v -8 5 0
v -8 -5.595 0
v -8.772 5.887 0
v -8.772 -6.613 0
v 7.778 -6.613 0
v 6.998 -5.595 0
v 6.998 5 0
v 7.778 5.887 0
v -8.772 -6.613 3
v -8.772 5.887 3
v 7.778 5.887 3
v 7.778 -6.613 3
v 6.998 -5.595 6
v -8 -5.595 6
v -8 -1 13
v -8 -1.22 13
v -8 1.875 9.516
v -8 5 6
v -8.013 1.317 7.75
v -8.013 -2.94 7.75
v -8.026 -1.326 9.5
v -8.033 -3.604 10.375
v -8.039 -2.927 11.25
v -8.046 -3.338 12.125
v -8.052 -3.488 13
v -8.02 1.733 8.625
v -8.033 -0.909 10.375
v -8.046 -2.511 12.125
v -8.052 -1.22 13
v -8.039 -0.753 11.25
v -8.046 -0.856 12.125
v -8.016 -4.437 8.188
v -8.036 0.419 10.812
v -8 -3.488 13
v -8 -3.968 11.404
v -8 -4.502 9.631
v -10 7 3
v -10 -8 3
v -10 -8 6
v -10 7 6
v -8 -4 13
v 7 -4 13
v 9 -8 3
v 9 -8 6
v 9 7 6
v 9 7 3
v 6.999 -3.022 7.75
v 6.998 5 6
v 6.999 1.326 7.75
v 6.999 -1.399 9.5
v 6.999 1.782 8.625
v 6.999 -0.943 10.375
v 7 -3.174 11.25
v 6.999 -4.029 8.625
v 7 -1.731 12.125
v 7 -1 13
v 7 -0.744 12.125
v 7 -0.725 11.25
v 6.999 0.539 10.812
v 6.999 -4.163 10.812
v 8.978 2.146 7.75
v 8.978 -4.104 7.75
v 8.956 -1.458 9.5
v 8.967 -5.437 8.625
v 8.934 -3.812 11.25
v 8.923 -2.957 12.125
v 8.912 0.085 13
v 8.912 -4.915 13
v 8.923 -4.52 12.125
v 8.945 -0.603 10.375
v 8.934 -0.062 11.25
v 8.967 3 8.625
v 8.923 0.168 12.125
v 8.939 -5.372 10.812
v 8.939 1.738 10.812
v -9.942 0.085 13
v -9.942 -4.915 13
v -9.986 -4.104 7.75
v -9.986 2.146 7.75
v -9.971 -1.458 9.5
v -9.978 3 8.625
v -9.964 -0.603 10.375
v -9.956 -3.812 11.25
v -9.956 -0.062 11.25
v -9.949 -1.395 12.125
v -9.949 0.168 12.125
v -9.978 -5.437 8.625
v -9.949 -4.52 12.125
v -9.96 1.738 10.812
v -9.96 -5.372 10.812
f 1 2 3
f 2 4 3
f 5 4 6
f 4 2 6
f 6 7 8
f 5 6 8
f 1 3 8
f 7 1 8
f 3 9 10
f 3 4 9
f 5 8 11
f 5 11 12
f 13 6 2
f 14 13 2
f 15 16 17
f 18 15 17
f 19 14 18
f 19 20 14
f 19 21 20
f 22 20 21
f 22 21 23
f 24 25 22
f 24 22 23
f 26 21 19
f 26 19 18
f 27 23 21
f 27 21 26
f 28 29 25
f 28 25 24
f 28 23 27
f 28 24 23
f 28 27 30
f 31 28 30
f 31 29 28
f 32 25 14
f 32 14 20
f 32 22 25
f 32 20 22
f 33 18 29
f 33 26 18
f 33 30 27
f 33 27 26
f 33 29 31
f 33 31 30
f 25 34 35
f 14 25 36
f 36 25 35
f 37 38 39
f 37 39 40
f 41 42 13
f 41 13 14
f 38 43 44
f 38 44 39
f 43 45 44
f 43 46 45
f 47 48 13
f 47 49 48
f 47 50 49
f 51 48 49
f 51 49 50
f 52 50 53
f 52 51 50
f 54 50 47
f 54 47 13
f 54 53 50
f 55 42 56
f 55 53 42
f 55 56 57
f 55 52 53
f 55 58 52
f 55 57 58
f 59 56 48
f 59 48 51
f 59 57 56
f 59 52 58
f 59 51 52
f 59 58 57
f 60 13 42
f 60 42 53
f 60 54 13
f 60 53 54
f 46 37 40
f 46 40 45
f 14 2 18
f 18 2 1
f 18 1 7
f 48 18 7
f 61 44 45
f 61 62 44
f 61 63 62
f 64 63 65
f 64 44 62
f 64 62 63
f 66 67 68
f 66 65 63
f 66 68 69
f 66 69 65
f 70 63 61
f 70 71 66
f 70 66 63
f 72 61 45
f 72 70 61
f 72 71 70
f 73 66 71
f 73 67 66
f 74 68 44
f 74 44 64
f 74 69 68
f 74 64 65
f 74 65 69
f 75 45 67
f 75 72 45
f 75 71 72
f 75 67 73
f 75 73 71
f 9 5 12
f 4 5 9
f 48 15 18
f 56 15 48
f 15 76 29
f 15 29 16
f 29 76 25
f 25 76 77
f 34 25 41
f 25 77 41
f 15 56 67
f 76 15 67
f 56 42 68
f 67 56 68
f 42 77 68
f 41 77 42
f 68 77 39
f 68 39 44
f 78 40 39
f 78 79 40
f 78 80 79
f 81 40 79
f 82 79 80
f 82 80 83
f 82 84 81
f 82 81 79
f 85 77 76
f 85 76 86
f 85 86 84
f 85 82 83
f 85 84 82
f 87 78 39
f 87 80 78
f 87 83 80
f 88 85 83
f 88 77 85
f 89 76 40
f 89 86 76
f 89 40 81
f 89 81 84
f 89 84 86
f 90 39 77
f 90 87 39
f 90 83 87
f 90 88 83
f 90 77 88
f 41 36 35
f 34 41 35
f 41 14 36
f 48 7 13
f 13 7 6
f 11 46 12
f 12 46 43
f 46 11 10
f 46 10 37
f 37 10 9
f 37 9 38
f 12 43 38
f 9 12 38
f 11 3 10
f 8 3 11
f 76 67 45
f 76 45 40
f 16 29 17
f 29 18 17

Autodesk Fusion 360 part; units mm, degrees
sketch "Sketch1" plane through (0, 0, 0) normal (0, 0, 1) x (1, 0, 0)
  line L0 (-8.7725, 5.8867) -> (7.7775, 5.8867)
  line L1 (7.7775, 5.8867) -> (7.7775, -6.6133)
  line L2 (7.7775, -6.6133) -> (-8.7725, -6.6133)
  line L3 (-8.7725, -6.6133) -> (-8.7725, 5.8867)
  line L4 (-8, 5) -> (6.9982, 5)
  line L5 (6.9982, 5) -> (6.9982, -5.595)
  line L6 (6.9982, -5.595) -> (-8, -5.595)
  line L7 (-8, -5.595) -> (-8, 5)
  dimension "d1" = 16.55
  dimension "d2" = 12.5
extrude "Extrude1" add sketch "Sketch1" along normal blind 3
sketch "Sketch2" plane through (0, 0, 3) normal (0, 0, 1) x (-1, 0, 0)
  line L0 (-6.9982, 5.595) -> (8, 5.595)
  line L1 (8, 5.595) -> (8, -5)
  line L2 (8, -5) -> (-6.9982, -5)
  line L3 (-6.9982, -5) -> (-6.9982, 5.595)
  line L4 (8.7725, 6.6133) -> (-7.7775, 6.6133)
  line L5 (-7.7775, 6.6133) -> (-7.7775, -5.8867)
  line L6 (-7.7775, -5.8867) -> (8.7725, -5.8867)
  line L7 (8.7725, -5.8867) -> (8.7725, 6.6133)
  line L8 (10, -7) -> (-9, -7)
  line L9 (-9, -7) -> (-9, 8)
  line L10 (-9, 8) -> (10, 8)
  line L11 (10, 8) -> (10, -7)
extrude "Extrude2" add sketch "Sketch2" along normal blind 3 contours L4 L5 L6 L7 | L8 L9 L10 L11
ref_plane "WorkPlane1" through (-0.5, -0.5, 13) normal (0, 0, 1) x (1, 0, 0)
sketch "Sketch4" plane through (-0.5, -0.5, 13) normal (0, 0, 1) x (1, 0, 0)
  line L0 (-9.442, -4.4154) -> (9.4117, -4.4154)
  line L1 (9.4117, -4.4154) -> (9.4117, 0.5846)
  line L2 (9.4117, 0.5846) -> (-9.442, 0.5846)
  line L3 (-9.442, 0.5846) -> (-9.442, -4.4154)
  line L4 (-7.5524, -2.9878) -> (7.4802, -2.9878)
  line L5 (7.4802, -2.9878) -> (7.4802, -0.7203)
  line L6 (7.4802, -0.7203) -> (-7.5524, -0.7203)
  line L7 (-7.5524, -0.7203) -> (-7.5524, -2.9878)
  dimension "d8" = 5
sketch "Sketch5" plane through (0, 0, 6) normal (0, 0, 1) x (-1, 0, 0)
  line L0 (8, -5) -> (-6.9982, -5)
  line L1 (-6.9982, -5) -> (-6.9982, 5.595)
  line L2 (-6.9982, 5.595) -> (8, 5.595)
  line L3 (8, 5.595) -> (8, -5)
  line L4 (10, 8) -> (-9, 8)
  line L5 (-9, 8) -> (-9, -7)
  line L6 (-9, -7) -> (10, -7)
  line L7 (10, -7) -> (10, 8)
  line L8 (10, -7) -> (-9, -7)
  line L9 (-9, -7) -> (-9, 8)
  line L10 (-9, 8) -> (10, 8)
  line L11 (10, 8) -> (10, -7)
loft "Loft1" add profiles "Sketch5", "Sketch4" section 1 section 2
sketch "Sketch6" plane through (0, 0, 13) normal (0, 0, 1) x (-1, 0, 0)
  line L0 (9.942, 4.9154) -> (-8.9117, 4.9154)
  line L1 (-8.9117, 4.9154) -> (-8.9117, -0.0846)
  line L2 (-8.9117, -0.0846) -> (9.942, -0.0846)
  line L3 (9.942, -0.0846) -> (9.942, 4.9154)
  line L4 (8, 1) -> (-7, 1)
  line L5 (-7, 1) -> (-7, 4)
  line L6 (-7, 4) -> (8, 4)
  line L7 (8, 4) -> (8, 1)
sketch "Sketch7" plane through (0, 0, 6) normal (0, 0, -1) x (1, 0, 0)
  line L0 (6.9982, -5) -> (6.9982, 5.595)
  line L1 (6.9982, 5.595) -> (-8, 5.595)
  line L2 (-8, 5.595) -> (-8, -5)
  line L3 (-8, -5) -> (6.9982, -5)
  line L4 (-8, 5.595) -> (6.9982, 5.595)
  line L5 (6.9982, 5.595) -> (6.9982, -5)
  line L6 (6.9982, -5) -> (-8, -5)
  line L7 (-8, -5) -> (-8, 5.595)
loft "Loft2" cut profiles "Sketch7", "Sketch6" section 1 section 2 contours L4 L5 L6 L7
